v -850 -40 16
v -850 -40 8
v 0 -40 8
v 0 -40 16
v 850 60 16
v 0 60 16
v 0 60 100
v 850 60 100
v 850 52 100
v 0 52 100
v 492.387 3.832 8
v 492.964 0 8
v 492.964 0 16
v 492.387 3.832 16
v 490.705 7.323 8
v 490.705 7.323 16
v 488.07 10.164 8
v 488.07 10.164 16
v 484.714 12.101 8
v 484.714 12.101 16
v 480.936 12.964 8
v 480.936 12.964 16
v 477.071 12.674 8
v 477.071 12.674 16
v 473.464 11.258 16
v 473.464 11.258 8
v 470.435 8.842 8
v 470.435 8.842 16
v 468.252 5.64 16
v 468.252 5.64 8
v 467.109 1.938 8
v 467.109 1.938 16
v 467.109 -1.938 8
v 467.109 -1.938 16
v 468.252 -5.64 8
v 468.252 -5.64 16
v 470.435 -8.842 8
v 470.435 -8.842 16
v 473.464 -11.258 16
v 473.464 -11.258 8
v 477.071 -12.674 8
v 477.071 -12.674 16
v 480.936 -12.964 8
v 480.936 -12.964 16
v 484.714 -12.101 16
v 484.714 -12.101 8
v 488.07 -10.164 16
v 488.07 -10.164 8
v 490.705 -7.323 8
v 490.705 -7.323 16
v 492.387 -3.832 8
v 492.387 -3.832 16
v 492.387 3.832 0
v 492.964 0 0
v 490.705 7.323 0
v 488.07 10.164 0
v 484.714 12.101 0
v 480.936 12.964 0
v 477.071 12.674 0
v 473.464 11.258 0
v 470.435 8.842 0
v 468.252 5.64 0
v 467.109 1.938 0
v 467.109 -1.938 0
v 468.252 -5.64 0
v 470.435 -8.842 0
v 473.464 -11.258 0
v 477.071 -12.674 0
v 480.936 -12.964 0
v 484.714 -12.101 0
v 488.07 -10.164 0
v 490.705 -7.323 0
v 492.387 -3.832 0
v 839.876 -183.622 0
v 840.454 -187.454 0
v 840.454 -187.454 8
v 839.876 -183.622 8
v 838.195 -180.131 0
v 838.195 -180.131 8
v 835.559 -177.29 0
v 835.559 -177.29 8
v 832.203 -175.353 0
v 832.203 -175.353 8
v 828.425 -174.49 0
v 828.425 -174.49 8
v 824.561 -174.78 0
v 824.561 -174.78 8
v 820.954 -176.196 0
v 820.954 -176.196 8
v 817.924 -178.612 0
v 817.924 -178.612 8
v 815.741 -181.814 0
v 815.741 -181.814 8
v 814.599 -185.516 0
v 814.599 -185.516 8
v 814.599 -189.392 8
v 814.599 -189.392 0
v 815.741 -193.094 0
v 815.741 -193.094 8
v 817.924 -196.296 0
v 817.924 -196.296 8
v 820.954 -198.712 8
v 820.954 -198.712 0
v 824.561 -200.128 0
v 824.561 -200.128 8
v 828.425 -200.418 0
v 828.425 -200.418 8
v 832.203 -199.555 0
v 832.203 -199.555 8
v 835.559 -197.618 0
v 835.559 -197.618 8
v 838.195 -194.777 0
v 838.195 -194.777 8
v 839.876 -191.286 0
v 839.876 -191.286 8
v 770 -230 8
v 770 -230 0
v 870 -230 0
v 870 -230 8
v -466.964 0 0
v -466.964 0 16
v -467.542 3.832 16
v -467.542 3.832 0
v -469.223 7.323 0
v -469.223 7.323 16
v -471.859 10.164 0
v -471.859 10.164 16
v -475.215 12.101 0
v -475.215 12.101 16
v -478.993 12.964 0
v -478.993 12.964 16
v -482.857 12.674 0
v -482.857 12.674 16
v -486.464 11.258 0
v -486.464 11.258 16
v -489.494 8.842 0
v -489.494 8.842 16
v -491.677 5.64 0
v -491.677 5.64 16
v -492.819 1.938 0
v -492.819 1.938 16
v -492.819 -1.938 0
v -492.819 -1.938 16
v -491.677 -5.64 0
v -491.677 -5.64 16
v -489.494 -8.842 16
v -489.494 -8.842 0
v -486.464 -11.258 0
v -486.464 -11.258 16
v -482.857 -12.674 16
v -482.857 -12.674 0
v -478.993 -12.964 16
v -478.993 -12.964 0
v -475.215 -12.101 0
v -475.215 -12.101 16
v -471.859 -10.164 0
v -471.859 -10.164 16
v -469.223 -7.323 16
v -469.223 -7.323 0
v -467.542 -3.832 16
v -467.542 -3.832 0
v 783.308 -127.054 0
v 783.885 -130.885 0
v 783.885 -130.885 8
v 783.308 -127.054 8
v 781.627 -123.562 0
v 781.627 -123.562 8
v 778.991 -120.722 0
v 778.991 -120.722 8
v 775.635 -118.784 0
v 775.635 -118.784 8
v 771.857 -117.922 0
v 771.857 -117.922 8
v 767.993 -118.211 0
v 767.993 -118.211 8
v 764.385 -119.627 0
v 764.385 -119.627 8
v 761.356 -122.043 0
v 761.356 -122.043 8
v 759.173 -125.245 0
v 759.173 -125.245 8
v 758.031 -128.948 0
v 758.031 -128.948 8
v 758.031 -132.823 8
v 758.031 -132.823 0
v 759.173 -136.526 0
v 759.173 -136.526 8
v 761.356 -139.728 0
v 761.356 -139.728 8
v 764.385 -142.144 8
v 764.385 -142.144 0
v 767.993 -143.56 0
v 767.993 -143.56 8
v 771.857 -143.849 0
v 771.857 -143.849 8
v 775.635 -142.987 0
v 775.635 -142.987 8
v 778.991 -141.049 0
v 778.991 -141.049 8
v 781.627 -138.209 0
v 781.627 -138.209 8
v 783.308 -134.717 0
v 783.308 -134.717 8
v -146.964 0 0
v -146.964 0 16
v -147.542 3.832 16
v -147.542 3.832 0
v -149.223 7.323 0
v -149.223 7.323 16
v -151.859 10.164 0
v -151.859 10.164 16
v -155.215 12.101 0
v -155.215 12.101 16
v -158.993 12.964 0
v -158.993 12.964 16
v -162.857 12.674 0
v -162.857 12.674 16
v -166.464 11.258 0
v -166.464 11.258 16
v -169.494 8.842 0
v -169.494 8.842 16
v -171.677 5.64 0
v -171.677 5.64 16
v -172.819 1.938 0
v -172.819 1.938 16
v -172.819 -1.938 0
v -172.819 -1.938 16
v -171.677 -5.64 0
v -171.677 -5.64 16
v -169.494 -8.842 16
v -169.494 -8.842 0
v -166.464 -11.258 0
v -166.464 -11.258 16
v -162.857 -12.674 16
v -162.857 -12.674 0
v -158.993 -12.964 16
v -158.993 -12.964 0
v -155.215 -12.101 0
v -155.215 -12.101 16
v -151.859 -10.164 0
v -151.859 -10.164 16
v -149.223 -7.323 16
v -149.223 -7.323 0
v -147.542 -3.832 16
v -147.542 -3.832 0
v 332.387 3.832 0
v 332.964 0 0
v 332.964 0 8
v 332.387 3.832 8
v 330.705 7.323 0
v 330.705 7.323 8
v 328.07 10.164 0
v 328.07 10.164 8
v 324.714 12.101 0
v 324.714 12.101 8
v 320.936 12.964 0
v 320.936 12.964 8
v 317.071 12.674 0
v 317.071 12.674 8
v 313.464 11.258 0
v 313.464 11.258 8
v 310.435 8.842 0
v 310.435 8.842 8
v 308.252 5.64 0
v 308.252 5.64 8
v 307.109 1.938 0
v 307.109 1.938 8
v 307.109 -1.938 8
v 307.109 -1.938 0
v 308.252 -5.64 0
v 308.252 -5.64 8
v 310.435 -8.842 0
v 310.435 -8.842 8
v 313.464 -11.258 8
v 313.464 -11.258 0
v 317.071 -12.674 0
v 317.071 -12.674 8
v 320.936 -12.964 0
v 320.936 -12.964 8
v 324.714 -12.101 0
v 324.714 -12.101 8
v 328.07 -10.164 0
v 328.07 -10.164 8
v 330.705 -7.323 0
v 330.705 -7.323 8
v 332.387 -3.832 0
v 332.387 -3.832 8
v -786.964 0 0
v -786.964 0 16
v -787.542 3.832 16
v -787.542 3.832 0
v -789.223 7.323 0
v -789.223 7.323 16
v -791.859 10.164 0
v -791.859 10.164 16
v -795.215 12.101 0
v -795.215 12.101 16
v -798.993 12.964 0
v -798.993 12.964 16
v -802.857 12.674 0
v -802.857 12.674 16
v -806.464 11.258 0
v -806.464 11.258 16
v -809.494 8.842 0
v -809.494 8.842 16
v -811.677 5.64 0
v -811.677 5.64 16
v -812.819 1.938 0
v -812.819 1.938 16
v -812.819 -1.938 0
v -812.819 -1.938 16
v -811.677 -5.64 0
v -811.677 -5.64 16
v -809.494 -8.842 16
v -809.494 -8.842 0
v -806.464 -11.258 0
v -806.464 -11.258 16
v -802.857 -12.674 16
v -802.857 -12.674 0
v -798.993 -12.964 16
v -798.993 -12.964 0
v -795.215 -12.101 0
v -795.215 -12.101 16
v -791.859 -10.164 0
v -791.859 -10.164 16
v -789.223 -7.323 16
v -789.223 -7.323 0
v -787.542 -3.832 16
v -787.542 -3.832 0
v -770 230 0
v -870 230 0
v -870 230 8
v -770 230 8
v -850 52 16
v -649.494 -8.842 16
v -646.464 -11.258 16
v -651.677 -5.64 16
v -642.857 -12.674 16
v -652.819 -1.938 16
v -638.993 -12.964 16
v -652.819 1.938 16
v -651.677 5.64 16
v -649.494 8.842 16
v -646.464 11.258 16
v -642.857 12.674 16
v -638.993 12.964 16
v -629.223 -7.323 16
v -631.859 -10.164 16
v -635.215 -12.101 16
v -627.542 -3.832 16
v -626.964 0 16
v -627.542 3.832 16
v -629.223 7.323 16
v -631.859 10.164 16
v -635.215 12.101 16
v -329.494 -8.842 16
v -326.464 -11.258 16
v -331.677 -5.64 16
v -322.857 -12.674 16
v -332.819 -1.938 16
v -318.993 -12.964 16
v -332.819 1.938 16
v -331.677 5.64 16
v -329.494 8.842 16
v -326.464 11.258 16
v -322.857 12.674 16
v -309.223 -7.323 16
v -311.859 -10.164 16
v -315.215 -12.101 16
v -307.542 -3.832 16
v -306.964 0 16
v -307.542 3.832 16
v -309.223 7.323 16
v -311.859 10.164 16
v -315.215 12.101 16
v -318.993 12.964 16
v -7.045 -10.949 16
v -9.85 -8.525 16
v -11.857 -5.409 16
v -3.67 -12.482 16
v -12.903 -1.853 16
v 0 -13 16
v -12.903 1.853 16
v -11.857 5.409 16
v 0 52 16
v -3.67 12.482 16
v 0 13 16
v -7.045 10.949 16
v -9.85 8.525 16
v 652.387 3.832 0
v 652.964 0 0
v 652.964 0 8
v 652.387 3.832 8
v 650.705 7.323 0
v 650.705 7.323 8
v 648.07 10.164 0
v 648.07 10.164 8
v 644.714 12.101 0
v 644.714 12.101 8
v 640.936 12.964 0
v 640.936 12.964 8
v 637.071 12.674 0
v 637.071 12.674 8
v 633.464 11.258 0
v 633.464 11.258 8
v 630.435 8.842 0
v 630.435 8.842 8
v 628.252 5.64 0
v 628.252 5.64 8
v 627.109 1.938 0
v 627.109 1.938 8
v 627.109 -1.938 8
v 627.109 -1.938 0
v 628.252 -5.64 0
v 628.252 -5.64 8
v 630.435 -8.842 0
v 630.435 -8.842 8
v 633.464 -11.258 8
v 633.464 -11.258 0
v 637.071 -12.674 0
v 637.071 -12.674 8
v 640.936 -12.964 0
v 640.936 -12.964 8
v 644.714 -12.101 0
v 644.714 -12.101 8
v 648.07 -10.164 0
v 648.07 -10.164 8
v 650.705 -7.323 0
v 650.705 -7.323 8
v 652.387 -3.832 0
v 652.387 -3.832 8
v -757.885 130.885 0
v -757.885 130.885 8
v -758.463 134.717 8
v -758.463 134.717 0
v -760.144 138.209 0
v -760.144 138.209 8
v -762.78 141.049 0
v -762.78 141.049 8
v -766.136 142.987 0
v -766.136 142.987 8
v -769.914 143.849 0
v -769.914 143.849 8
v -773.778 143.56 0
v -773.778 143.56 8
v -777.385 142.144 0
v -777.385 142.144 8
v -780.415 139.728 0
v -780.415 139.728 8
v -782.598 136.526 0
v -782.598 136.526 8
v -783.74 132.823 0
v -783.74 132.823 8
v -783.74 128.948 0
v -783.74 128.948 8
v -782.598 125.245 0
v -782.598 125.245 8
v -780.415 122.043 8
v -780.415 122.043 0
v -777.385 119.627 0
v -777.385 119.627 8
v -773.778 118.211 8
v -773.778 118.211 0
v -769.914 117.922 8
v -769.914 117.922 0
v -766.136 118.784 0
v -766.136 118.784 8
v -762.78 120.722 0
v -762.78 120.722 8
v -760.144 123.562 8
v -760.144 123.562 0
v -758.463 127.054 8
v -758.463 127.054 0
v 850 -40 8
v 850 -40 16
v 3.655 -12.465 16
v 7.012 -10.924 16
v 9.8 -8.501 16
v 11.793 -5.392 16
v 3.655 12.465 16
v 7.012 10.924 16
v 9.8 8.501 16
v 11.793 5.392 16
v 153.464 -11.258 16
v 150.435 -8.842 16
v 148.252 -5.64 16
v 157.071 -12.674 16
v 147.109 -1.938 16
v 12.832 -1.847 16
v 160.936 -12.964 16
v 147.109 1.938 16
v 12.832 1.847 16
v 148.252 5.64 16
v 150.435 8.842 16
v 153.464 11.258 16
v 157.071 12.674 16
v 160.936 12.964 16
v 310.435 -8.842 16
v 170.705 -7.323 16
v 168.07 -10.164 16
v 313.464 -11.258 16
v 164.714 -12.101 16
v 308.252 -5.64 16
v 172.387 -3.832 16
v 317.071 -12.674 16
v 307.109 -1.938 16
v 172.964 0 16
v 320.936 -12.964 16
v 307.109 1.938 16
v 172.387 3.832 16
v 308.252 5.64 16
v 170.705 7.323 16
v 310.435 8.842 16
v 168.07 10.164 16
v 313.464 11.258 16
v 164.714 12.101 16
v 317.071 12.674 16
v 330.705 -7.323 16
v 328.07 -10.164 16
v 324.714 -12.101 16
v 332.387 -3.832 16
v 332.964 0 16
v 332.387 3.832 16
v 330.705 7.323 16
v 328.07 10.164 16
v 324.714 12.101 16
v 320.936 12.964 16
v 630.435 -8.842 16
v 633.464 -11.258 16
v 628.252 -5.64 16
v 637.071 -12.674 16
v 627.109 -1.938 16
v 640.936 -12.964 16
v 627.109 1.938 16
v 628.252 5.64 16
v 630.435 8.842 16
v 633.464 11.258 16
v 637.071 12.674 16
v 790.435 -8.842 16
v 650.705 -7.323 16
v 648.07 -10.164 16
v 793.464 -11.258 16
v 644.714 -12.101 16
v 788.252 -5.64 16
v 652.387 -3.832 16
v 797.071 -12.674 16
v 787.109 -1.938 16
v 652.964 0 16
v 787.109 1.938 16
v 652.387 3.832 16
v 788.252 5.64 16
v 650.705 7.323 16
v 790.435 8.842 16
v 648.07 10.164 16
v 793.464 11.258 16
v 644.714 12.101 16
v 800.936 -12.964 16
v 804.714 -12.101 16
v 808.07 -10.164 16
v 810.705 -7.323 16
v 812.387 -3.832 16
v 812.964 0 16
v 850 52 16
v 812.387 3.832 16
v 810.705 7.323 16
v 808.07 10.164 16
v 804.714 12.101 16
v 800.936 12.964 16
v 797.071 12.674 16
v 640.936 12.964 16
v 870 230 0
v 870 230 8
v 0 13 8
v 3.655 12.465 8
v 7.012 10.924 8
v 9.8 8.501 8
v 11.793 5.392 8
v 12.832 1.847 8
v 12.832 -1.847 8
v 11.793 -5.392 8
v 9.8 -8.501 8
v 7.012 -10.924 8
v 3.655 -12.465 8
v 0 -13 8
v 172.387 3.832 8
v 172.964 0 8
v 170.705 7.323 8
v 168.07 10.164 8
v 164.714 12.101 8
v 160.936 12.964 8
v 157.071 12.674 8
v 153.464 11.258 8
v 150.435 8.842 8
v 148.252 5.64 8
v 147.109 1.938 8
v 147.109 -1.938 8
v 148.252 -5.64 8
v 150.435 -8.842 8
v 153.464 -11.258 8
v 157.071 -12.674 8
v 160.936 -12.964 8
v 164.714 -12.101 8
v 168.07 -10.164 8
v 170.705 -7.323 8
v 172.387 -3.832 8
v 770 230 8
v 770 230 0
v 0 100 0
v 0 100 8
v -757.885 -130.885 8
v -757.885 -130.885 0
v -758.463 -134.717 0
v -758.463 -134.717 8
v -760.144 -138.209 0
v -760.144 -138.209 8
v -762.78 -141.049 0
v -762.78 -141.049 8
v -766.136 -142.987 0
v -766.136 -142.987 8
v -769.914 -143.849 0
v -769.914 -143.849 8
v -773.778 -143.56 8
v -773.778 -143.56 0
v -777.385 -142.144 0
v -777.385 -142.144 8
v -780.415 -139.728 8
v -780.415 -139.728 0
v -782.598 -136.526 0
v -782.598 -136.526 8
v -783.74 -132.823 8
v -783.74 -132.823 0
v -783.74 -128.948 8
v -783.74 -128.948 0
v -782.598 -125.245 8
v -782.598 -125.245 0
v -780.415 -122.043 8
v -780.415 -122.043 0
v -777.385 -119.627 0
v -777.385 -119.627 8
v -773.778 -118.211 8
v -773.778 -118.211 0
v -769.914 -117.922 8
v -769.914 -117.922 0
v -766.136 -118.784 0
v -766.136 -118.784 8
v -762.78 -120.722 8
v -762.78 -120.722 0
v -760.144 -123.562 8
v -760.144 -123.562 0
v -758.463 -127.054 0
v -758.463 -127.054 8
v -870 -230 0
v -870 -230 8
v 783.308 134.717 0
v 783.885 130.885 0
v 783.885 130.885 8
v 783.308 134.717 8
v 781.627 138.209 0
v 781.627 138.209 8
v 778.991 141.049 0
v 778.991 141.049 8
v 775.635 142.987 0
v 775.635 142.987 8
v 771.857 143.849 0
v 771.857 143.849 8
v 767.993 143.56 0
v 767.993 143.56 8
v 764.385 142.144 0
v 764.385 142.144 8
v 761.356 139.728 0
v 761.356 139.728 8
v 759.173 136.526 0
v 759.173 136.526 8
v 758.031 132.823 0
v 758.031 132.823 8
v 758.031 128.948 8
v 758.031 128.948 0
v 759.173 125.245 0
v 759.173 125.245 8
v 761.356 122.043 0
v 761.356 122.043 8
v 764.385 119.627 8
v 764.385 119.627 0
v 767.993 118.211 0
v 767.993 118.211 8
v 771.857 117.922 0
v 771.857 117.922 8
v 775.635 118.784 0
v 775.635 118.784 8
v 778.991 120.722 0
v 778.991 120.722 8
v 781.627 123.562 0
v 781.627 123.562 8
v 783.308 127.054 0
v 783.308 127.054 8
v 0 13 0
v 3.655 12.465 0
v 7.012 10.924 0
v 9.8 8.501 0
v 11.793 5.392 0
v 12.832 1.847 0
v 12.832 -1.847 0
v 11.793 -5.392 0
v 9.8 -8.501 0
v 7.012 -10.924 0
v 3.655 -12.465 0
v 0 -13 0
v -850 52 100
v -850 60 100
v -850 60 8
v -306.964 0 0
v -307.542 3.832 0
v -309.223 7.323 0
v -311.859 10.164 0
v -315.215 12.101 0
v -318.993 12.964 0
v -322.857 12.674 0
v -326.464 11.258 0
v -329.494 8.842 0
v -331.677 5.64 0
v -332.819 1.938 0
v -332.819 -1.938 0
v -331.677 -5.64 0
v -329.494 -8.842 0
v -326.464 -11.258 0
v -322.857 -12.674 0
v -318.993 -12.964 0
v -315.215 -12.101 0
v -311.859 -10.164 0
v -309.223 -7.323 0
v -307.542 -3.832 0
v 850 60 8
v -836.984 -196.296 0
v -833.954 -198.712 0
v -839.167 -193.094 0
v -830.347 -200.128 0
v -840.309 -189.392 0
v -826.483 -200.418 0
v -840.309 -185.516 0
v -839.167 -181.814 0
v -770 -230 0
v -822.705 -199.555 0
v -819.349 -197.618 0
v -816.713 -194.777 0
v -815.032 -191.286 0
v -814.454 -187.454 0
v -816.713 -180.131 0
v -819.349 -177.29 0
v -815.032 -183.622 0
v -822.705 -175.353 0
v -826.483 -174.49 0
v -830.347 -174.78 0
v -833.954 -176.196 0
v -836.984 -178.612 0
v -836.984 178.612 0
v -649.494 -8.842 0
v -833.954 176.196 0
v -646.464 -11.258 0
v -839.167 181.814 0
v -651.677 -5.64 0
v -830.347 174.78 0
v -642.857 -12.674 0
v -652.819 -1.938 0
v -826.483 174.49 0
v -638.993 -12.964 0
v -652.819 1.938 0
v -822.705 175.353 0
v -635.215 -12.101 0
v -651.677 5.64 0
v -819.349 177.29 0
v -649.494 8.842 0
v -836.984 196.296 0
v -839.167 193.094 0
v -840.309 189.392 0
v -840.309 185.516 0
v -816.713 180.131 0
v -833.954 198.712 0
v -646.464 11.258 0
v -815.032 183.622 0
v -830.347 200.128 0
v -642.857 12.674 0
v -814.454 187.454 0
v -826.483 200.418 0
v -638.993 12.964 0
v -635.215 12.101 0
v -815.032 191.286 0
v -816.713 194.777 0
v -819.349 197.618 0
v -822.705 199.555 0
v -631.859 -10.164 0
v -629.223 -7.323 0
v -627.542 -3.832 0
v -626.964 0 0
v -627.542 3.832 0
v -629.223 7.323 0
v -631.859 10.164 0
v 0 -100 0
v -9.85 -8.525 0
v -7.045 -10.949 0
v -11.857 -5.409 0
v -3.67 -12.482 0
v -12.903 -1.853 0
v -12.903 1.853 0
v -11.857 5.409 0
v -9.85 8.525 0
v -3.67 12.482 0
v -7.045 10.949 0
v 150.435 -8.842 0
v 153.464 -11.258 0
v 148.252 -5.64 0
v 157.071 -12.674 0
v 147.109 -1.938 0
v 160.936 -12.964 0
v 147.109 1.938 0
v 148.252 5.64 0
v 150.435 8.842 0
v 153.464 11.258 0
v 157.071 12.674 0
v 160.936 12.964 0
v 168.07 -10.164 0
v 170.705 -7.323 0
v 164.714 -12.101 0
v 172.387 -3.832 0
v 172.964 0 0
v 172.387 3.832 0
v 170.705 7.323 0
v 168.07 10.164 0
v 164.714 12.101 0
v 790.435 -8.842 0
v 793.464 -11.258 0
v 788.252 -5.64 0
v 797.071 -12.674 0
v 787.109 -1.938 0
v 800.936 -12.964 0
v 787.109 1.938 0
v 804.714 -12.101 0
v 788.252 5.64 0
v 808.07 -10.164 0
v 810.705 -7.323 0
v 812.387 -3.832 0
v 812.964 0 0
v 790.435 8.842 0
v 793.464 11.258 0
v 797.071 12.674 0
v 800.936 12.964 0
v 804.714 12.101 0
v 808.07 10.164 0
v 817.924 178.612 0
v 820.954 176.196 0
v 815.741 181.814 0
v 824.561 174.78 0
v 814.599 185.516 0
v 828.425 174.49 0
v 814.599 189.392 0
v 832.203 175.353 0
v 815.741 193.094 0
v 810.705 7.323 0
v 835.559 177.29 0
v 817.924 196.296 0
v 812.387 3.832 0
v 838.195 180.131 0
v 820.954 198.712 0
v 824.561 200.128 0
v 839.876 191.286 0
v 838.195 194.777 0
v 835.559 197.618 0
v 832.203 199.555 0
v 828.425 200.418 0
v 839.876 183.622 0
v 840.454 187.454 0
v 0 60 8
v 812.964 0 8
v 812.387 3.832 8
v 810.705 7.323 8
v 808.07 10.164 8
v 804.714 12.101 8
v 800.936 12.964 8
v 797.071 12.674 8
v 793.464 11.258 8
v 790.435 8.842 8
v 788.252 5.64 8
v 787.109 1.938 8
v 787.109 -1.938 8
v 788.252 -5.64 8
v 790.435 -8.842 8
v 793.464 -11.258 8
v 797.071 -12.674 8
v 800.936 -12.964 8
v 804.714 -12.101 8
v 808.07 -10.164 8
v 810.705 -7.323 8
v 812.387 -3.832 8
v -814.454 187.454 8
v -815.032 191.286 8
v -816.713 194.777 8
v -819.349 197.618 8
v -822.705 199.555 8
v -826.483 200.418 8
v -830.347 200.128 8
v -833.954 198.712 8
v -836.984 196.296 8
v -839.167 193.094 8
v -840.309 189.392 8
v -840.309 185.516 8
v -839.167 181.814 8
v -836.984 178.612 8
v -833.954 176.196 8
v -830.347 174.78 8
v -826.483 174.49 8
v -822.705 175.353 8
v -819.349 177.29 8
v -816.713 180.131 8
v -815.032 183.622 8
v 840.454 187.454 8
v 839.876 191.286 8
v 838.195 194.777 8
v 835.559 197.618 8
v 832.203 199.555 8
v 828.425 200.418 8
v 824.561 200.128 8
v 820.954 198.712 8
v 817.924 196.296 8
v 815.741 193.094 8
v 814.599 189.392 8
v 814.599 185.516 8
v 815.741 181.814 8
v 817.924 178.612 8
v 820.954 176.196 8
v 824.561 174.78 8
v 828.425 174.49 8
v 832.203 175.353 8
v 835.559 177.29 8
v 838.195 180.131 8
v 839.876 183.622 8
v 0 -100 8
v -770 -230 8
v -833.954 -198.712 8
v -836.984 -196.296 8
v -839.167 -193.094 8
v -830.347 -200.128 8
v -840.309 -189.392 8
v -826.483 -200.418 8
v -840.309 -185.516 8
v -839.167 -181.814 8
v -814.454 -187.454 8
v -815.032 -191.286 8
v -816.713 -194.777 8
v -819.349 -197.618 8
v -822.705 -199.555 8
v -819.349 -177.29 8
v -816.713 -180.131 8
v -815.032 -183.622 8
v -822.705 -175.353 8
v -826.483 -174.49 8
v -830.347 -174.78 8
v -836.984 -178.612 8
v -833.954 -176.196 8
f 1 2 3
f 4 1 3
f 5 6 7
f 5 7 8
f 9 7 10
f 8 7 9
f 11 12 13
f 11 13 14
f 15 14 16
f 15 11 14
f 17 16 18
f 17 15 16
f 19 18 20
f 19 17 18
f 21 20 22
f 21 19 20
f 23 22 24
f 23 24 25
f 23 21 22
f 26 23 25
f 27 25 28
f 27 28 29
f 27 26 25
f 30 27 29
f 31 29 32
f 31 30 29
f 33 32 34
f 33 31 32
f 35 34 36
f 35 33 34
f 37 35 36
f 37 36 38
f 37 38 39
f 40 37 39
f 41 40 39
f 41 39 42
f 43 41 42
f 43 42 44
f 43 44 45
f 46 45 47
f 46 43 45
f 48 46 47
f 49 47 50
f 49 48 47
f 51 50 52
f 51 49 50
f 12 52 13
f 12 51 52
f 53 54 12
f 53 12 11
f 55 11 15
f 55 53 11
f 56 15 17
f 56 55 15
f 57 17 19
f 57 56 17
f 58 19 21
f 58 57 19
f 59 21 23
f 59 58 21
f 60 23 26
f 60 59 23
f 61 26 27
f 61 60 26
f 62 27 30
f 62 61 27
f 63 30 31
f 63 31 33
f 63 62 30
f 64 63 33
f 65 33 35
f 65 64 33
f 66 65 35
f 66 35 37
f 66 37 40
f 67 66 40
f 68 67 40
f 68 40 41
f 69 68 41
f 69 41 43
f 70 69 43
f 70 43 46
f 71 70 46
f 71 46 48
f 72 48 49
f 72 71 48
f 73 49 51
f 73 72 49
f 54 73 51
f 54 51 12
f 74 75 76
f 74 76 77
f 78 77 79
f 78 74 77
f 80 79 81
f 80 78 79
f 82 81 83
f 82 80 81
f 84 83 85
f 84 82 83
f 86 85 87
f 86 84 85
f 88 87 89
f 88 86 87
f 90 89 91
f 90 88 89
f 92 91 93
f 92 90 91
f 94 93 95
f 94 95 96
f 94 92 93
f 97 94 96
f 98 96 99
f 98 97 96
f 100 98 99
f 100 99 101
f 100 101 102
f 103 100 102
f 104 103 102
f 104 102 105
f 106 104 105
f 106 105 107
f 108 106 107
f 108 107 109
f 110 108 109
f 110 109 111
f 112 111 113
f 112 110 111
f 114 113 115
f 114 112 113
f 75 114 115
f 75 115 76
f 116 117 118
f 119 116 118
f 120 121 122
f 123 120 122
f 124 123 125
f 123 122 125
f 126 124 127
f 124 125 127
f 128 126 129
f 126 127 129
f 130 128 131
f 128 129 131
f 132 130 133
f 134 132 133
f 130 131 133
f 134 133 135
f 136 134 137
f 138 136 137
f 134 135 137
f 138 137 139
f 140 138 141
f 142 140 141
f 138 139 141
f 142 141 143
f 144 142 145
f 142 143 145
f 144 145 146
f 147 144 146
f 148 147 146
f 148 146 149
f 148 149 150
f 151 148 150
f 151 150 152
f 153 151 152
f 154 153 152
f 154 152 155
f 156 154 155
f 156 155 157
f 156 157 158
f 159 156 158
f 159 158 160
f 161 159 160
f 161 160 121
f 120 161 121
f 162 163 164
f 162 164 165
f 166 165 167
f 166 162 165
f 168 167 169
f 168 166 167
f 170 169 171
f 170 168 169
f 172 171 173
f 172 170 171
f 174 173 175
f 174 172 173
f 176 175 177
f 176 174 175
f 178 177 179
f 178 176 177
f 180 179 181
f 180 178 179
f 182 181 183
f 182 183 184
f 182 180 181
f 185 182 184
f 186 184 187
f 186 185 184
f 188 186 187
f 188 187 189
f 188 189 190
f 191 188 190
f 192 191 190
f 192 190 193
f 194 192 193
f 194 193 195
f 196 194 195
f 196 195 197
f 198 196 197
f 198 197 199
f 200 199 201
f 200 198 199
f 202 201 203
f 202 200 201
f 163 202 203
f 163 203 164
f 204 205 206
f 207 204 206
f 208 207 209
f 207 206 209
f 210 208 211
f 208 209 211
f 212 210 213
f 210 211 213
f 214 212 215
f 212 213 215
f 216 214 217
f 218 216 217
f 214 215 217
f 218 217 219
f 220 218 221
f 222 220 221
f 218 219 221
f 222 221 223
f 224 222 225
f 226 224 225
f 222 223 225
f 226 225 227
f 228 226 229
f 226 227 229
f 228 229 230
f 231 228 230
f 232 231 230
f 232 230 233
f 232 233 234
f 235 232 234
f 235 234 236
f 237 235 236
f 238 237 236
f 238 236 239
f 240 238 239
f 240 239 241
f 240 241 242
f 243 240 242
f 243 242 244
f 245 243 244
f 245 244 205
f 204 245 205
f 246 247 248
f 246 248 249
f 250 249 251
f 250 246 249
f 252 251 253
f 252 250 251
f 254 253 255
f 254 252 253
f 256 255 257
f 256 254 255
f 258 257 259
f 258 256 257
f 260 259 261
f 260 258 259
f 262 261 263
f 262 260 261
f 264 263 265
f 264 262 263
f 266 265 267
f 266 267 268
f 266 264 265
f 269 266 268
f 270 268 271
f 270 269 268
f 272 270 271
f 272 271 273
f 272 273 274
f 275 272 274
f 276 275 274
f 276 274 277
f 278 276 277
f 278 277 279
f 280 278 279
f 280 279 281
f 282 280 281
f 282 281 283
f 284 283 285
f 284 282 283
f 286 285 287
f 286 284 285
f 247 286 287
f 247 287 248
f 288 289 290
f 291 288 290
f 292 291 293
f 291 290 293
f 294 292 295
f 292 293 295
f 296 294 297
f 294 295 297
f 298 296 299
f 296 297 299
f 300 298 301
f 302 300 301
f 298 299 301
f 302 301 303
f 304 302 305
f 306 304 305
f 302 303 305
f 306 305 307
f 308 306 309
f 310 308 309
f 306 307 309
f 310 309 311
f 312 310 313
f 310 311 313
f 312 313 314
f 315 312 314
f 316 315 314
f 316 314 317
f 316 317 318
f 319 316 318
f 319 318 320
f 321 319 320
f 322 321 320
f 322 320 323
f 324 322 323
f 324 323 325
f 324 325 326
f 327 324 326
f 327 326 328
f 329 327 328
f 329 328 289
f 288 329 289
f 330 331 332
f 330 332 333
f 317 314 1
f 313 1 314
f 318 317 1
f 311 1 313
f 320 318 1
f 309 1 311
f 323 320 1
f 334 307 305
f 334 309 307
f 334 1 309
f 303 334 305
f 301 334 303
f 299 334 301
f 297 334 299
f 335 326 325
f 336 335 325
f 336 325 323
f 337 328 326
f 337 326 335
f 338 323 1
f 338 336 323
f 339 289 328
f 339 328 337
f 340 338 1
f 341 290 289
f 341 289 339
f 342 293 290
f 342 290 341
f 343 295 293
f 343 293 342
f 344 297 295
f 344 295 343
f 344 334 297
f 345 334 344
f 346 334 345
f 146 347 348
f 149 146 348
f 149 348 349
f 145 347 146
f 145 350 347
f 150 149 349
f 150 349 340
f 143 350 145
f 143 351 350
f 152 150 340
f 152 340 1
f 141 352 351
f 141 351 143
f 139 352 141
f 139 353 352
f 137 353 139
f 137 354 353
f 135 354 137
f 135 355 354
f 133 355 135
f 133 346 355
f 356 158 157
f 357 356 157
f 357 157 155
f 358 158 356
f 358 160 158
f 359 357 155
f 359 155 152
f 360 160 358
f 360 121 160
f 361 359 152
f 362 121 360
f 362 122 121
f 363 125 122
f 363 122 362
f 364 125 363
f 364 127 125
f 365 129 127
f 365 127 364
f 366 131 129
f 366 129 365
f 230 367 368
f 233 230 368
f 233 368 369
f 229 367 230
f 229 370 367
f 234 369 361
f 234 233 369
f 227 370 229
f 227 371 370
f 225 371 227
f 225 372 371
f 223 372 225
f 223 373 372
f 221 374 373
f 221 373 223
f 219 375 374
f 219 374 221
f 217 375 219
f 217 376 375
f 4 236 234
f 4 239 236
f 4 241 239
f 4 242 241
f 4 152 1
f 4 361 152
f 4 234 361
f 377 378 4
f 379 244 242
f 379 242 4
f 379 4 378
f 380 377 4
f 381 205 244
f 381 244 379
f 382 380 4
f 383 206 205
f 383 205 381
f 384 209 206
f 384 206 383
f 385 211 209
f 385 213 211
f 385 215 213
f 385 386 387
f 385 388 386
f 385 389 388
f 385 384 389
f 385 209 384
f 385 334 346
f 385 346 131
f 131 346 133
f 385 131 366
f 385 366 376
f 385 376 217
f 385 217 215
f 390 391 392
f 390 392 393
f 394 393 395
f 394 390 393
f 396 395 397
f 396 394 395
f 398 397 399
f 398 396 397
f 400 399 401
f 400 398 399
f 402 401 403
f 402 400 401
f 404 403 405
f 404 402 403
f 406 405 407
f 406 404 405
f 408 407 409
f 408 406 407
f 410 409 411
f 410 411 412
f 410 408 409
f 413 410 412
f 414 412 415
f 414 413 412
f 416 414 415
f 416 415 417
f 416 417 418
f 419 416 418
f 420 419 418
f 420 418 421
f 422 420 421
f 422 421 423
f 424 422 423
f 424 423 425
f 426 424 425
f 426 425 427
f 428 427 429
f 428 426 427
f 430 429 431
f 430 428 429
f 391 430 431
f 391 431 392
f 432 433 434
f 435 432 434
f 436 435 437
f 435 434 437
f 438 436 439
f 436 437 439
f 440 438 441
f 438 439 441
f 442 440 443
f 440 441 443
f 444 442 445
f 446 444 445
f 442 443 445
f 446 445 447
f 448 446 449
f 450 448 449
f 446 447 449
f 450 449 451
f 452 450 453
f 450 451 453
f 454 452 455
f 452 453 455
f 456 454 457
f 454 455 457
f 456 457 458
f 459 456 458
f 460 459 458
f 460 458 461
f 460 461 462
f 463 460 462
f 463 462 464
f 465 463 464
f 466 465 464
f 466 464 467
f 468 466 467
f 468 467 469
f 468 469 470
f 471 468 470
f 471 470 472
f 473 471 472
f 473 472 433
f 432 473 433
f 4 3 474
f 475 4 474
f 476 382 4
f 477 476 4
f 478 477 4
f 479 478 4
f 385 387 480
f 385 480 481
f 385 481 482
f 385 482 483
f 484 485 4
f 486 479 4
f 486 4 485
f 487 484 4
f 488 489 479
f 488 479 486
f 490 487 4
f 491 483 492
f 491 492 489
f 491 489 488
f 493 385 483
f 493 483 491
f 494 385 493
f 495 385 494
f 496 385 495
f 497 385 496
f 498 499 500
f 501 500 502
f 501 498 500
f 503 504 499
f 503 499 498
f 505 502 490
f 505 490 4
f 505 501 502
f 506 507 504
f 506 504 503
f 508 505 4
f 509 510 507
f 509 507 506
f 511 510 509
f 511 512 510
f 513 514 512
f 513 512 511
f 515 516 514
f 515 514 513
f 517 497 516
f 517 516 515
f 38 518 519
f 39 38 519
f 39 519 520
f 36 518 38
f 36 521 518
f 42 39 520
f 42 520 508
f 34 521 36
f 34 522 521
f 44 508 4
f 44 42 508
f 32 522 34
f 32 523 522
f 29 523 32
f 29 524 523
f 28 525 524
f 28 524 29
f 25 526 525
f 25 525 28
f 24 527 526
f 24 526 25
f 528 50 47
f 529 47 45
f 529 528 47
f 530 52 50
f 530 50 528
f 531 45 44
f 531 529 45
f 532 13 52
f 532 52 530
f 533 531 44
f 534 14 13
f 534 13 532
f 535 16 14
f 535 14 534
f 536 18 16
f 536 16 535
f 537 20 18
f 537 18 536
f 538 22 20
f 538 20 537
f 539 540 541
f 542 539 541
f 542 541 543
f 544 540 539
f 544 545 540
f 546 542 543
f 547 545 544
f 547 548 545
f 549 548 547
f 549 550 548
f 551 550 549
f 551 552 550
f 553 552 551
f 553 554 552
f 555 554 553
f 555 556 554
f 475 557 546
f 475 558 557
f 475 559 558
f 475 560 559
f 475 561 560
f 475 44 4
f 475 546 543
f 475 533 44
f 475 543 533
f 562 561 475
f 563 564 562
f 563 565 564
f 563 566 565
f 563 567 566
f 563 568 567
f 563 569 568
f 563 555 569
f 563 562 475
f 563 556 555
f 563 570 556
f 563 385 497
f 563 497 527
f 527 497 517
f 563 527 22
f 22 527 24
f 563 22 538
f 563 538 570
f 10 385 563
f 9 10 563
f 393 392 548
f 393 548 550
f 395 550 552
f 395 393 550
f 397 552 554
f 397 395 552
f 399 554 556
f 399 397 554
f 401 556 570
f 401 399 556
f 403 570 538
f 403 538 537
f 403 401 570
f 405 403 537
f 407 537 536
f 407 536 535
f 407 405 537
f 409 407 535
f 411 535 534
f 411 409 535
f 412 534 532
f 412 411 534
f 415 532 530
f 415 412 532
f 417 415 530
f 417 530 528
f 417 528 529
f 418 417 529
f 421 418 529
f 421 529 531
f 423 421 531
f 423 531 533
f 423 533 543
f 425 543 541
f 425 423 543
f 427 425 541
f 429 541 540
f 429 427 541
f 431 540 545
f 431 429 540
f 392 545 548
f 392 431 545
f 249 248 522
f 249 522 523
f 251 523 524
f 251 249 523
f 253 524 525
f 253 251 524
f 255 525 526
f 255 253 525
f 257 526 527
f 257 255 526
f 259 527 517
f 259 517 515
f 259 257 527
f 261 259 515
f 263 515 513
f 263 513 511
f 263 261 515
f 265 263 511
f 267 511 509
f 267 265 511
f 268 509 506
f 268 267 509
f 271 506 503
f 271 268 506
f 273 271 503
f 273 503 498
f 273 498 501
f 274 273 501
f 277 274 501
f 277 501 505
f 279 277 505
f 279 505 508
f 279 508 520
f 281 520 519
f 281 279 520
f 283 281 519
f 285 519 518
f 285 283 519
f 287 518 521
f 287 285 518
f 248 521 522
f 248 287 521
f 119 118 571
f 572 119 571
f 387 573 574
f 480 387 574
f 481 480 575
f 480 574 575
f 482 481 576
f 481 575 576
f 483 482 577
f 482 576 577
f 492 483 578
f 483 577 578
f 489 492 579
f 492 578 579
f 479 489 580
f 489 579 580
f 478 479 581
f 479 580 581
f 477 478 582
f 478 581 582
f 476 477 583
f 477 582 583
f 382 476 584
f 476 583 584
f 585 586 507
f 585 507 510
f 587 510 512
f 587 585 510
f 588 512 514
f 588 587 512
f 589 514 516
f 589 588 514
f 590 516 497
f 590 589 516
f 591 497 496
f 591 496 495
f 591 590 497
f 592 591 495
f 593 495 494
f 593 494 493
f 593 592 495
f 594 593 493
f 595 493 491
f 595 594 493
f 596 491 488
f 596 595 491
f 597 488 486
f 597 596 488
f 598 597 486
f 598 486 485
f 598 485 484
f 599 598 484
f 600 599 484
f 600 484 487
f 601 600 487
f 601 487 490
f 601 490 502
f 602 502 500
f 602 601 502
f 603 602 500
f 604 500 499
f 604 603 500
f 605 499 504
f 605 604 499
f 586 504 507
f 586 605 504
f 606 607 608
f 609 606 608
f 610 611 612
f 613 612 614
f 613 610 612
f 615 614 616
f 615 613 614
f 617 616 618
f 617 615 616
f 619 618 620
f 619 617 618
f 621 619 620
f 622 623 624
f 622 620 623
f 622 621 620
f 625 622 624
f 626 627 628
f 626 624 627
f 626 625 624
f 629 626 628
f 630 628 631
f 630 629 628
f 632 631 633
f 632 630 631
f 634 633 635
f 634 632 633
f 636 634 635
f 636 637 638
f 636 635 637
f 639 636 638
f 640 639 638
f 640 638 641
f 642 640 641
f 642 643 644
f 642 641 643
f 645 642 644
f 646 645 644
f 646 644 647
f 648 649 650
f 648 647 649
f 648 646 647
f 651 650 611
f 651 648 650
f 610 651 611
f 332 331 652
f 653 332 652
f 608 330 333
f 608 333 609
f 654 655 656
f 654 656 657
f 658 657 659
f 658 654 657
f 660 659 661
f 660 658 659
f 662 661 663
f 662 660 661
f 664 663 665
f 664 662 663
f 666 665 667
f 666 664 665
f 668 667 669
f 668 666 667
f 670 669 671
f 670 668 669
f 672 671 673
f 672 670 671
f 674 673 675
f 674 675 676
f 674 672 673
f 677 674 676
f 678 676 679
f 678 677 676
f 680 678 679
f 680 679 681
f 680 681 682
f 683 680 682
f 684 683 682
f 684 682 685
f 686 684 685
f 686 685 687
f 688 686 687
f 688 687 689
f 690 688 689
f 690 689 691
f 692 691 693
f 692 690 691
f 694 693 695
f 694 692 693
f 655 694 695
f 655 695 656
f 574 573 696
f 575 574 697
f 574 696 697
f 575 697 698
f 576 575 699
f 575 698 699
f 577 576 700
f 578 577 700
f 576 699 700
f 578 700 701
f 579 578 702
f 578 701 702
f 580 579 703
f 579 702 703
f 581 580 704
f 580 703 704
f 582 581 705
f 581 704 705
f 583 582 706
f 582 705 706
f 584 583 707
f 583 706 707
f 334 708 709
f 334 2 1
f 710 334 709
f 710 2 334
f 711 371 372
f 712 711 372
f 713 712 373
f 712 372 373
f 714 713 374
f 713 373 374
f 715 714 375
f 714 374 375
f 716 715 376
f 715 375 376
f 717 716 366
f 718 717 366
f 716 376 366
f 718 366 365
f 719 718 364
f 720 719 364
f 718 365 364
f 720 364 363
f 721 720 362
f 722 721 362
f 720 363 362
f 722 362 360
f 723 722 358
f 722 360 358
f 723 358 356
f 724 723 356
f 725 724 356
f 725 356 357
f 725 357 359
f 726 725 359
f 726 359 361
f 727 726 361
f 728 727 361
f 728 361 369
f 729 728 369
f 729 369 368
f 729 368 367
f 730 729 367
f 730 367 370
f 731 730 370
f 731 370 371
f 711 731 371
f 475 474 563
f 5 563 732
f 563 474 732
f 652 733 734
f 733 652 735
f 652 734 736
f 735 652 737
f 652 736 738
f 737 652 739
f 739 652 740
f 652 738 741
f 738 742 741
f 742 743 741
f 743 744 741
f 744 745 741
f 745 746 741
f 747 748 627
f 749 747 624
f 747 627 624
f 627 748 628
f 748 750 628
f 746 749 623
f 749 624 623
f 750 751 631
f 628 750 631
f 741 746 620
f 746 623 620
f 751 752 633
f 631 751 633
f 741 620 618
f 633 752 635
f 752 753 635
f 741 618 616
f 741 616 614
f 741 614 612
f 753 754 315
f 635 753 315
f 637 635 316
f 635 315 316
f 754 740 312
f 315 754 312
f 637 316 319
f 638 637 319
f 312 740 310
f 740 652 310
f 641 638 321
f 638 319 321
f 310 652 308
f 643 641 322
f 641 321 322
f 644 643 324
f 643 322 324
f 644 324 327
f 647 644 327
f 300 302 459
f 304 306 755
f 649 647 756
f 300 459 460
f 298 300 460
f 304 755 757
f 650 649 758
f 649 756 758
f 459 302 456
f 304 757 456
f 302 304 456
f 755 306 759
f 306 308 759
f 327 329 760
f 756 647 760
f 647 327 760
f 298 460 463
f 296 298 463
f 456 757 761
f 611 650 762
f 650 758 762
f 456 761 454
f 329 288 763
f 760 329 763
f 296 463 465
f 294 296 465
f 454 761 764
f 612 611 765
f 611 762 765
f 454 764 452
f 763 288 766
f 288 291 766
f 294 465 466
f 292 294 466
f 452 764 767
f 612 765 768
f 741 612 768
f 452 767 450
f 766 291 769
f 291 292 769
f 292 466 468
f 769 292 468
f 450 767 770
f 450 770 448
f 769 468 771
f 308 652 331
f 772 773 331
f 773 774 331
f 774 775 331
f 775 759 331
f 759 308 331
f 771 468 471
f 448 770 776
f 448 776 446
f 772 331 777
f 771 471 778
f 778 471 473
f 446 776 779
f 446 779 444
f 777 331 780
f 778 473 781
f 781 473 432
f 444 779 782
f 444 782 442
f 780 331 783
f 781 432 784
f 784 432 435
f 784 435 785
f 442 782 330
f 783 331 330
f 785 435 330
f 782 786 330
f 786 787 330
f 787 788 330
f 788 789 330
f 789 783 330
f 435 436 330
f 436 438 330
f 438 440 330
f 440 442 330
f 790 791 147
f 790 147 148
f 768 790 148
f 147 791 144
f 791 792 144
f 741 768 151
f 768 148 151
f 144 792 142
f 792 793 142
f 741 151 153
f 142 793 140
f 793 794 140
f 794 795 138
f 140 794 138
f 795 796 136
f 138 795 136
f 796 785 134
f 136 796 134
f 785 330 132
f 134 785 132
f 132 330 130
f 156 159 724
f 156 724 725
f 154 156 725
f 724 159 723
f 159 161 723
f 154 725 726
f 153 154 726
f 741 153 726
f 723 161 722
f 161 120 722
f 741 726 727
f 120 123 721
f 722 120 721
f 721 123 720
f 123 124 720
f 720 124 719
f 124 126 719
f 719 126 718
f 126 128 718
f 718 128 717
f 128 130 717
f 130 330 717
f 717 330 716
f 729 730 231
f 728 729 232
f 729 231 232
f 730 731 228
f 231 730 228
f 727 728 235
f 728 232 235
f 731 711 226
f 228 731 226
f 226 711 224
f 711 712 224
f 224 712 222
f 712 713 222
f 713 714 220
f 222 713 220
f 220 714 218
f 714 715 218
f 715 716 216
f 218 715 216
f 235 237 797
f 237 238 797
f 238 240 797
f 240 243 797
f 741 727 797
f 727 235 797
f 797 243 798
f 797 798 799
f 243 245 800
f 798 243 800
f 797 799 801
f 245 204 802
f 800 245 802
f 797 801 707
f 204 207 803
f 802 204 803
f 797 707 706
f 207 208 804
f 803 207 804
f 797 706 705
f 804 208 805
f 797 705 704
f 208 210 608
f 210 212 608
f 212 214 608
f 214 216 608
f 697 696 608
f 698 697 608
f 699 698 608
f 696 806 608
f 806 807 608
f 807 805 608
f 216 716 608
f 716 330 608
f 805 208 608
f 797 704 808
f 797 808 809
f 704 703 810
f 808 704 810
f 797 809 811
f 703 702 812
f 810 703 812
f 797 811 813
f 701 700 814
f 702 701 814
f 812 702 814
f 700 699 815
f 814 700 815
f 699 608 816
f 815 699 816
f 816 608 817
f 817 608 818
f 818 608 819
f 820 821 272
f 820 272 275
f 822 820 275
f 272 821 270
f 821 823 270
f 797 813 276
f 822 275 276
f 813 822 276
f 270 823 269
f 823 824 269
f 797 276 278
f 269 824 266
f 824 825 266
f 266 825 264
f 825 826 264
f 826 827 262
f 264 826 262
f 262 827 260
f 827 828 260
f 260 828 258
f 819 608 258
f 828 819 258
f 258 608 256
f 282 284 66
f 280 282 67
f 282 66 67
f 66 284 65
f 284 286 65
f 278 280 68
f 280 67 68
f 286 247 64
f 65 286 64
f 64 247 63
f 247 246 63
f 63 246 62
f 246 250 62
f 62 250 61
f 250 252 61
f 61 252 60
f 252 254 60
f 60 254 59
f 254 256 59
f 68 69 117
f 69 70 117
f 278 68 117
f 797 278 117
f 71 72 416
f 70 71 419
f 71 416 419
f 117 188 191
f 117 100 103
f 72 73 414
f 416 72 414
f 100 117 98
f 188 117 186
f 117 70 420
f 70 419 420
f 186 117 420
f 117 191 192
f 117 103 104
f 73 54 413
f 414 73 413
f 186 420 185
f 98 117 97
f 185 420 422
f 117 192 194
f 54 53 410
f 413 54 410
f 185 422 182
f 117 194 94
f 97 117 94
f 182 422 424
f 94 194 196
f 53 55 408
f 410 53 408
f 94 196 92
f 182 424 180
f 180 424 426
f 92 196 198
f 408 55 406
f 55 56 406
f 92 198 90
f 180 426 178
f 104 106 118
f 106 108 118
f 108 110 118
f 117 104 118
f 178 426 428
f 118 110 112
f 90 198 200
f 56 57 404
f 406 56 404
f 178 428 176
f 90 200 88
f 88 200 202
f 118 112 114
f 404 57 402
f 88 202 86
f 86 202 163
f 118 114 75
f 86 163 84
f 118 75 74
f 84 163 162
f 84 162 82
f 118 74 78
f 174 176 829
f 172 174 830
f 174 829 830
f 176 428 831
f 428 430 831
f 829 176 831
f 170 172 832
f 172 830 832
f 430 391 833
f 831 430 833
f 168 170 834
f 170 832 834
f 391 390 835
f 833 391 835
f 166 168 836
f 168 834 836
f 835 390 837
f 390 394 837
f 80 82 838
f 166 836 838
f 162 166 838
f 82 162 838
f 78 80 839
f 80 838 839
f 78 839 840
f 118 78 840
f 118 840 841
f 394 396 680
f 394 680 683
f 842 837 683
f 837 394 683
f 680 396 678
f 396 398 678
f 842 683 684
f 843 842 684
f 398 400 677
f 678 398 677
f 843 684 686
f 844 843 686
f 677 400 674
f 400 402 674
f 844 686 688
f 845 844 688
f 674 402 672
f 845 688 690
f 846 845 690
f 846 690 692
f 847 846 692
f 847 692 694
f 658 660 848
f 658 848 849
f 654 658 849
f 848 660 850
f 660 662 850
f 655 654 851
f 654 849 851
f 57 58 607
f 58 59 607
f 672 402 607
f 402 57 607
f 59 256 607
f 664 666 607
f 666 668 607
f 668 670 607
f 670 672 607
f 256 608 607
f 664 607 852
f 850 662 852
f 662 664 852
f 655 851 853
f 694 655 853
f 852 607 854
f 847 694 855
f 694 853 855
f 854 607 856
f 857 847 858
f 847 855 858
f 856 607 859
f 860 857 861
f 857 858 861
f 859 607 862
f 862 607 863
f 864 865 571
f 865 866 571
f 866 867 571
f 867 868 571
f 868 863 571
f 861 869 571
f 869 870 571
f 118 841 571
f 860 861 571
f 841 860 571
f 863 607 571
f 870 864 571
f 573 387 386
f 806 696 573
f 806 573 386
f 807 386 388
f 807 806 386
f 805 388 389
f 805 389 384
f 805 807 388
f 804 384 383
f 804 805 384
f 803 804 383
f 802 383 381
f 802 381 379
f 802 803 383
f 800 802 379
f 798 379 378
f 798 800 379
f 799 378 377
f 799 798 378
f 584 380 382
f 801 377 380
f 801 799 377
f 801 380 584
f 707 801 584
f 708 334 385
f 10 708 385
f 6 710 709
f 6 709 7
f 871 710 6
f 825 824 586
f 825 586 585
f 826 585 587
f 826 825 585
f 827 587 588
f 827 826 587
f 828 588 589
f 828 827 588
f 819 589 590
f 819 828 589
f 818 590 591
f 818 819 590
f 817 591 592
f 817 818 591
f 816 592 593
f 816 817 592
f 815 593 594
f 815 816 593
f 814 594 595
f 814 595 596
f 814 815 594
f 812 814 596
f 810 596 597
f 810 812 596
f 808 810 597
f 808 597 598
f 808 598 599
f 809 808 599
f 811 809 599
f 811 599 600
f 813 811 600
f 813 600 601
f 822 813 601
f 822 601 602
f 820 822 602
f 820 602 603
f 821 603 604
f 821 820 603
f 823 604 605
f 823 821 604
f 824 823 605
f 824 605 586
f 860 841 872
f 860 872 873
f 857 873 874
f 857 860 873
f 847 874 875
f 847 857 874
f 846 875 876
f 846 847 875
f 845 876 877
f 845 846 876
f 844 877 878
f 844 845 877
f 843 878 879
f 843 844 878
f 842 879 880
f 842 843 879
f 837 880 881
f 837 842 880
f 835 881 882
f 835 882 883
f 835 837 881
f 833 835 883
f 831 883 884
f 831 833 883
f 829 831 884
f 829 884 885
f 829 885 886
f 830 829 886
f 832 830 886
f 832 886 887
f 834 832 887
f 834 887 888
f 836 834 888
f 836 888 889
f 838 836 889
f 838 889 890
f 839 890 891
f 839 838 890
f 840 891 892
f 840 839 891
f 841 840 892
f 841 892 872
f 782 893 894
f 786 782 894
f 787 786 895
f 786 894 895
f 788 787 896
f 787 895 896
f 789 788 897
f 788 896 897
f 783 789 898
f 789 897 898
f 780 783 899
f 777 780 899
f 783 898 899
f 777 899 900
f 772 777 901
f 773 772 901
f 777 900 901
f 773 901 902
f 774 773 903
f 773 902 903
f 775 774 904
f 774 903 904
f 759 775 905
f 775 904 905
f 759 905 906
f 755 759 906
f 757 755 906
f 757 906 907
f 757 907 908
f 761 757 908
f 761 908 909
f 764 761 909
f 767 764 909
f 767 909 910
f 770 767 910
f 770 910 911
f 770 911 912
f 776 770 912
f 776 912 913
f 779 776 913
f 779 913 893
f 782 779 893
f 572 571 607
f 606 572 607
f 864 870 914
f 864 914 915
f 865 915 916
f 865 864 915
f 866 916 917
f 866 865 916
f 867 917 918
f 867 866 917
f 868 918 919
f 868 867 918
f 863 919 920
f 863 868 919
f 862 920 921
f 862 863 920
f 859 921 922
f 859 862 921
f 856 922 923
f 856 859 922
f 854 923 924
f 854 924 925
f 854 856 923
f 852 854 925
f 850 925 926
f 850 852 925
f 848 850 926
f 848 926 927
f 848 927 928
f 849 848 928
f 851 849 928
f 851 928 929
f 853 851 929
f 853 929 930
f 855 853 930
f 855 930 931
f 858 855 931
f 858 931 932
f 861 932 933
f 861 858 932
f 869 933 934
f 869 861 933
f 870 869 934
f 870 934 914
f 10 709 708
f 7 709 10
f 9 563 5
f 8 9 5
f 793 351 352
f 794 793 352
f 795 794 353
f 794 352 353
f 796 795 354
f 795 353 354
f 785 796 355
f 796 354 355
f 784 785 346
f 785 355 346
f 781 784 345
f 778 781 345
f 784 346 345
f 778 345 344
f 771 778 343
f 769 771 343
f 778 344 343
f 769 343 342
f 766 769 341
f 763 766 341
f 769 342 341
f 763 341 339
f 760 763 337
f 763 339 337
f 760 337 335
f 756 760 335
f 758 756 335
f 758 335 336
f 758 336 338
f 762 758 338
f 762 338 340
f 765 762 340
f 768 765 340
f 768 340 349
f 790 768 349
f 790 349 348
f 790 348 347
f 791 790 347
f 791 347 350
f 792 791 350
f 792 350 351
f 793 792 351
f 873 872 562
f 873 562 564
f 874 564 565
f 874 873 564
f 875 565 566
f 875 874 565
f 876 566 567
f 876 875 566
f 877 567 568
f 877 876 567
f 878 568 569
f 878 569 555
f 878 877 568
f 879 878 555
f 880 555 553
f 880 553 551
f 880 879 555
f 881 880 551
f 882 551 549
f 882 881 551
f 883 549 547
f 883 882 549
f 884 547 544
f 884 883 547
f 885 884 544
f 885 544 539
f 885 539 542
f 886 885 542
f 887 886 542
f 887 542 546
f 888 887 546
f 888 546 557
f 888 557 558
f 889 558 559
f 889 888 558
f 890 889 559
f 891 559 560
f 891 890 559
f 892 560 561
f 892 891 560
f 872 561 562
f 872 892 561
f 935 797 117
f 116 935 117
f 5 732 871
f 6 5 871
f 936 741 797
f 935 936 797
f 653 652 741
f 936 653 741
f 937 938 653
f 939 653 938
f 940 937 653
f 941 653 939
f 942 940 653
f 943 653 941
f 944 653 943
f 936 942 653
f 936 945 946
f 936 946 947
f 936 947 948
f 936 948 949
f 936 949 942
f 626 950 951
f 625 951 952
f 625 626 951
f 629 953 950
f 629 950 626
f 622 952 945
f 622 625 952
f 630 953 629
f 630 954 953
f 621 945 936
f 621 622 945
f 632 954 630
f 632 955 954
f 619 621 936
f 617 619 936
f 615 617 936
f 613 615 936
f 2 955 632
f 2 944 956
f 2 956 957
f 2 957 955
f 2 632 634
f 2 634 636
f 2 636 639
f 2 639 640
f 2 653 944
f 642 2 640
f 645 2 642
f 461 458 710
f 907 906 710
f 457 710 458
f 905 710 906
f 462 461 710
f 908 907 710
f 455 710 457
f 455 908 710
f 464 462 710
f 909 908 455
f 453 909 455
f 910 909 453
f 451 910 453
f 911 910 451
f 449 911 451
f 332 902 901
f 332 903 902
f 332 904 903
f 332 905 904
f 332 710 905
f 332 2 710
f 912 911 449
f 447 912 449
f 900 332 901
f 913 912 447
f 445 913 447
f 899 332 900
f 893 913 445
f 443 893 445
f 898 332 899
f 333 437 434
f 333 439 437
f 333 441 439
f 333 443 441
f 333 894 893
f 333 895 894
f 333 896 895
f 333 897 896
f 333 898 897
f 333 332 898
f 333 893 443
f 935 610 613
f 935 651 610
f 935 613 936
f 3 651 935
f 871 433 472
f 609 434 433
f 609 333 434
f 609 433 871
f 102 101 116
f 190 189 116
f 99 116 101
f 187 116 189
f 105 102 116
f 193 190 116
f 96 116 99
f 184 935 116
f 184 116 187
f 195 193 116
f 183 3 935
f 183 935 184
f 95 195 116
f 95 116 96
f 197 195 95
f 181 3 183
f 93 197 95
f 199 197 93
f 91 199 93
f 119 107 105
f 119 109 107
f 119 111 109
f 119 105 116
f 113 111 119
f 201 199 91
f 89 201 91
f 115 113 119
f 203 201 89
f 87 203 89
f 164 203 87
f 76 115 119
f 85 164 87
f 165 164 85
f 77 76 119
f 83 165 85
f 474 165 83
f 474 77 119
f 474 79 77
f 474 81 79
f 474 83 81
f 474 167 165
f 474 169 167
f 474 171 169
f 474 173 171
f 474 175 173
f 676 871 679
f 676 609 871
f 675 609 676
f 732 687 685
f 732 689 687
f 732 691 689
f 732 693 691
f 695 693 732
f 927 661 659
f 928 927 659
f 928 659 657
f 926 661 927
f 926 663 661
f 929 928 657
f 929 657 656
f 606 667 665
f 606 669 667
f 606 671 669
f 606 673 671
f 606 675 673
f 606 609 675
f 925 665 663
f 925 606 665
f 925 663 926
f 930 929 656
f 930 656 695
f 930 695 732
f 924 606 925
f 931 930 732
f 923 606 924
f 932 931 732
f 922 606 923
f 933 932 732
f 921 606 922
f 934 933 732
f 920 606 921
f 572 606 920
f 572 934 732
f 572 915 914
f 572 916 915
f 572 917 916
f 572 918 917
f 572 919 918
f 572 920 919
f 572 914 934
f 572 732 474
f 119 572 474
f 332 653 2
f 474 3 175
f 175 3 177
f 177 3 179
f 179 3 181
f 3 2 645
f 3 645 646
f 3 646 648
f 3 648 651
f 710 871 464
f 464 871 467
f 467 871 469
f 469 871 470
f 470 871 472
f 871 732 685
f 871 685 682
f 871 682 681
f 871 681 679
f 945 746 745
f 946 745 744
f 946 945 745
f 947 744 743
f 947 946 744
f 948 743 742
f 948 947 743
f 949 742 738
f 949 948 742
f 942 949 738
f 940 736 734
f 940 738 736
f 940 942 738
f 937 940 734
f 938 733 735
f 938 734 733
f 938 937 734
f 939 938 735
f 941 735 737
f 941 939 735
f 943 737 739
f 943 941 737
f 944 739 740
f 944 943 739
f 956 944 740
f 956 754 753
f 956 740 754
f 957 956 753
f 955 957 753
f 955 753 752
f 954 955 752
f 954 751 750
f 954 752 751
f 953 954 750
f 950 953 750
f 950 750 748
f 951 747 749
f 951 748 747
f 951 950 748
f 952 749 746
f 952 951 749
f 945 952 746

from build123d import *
from build123d.topology import SkipClean

# Parameters (mm, degrees)
EXTRUDE_2_DEPTH        = 8
SKETCH_5_W             = 850
SKETCH_5_H             = 100
EXTRUDE_3_DEPTH        = 8
SKETCH_6_W             = 850
SKETCH_6_H             = 8
EXTRUDE_4_DEPTH        = 84
SKETCH_7_R             = 13
CUT_EXTRUDE_1_DEPTH    = 905.579460302
SKETCH_9_R             = 13
CUT_EXTRUDE_3_DEPTH    = 904.800863022
PATTERN_LINEAR_2_COUNT = 6
PATTERN_LINEAR_2_PITCH = 160
MIRROR_7_DEPTH         = 16
MIRROR_7_2_OUTLINE_R   = 13
MIRROR_7_2_DEPTH       = 8
MIRROR_START           = 8
MIRROR_7_3_OUTLINE_R   = 13
MIRROR_7_3_DEPTH       = 8
MIRROR_START_2         = 16
MIRROR_7_4_OUTLINE_W   = 850
MIRROR_7_4_OUTLINE_H   = 8
MIRROR_7_4_DEPTH       = 84


# Read off the part's stored shape, not the designer's step: 镜向7
with BuildPart() as part:
    # 草图1 → 凸台-拉伸2 (new body)
    with BuildSketch(Plane.XY):
        Polygon((-870, 0), (-870, 230), (-770, 230), (0, 100), (0, 0), align=None)
    extrude_2 = extrude(amount=EXTRUDE_2_DEPTH)

    # 镜向2: 凸台-拉伸2 across plane
    add(extrude_2.mirror(Plane.ZX))

    # 草图5 → 凸台-拉伸3 (add)
    with BuildSketch(Plane.XY.offset(8)):
        with Locations((-425, 10)):
            Rectangle(SKETCH_5_W, SKETCH_5_H)
    extrude(amount=EXTRUDE_3_DEPTH)

    # 草图6 → 凸台-拉伸4 (add)
    with BuildSketch(Plane.XY.offset(16)):
        with Locations((-425, 56)):
            Rectangle(SKETCH_6_W, SKETCH_6_H)
    extrude(amount=EXTRUDE_4_DEPTH)

    # 草图7 → 切除-拉伸1 (cut, through all)
    with BuildSketch(Plane.XY.offset(8)):
        with Locations((-770.885465198, 130.885465198)):
            Circle(SKETCH_7_R)
        with Locations((-827.454007693, 187.454007693)):
            Circle(SKETCH_7_R)
    cut_extrude_1 = extrude(amount=-CUT_EXTRUDE_1_DEPTH, mode=Mode.SUBTRACT)

    # 镜向5: 切除-拉伸1 across plane
    add(cut_extrude_1.mirror(Plane.ZX), mode=Mode.SUBTRACT)

    # 草图9 → 切除-拉伸3 (cut, through all)
    with BuildSketch(Plane.XY.offset(16)):
        with Locations((-799.964208957, 0)):
            Circle(SKETCH_9_R)
    cut_extrude_3 = extrude(amount=-CUT_EXTRUDE_3_DEPTH, mode=Mode.SUBTRACT)

    # 阵列(线性)2: 切除-拉伸3 ×6
    with Locations(*[(i * PATTERN_LINEAR_2_PITCH, 0, 0) for i in range(1, PATTERN_LINEAR_2_COUNT)]):
        add(cut_extrude_3, mode=Mode.SUBTRACT)

    # 镜向7 outline → 镜向7 (cut)
    with BuildSketch(Plane.XY):
        with BuildLine():
            ThreePointArc((0, -12.999950731), (-12.964208957, 0), (0, 12.999950731))
            ThreePointArc((0, 12.999950731), (-13.035791043, 0), (0, -12.999950731))
        make_face()
    extrude(amount=MIRROR_7_DEPTH, mode=Mode.SUBTRACT)

    # Mirror 7 2 outline → Mirror 7 2 (add)
    with BuildSketch(Plane.XY):
        with BuildLine():
            Line((870, -230), (870, 230))
            Line((870, 230), (770, 230))
            Line((770, 230), (0, 100))
            Line((0, 100), (0, 12.999950731))
            ThreePointArc((0, 12.999950731), (12.964208957, 0), (0, -12.999950731))
            Line((0, -12.999950731), (0, -100))
            Line((0, -100), (770, -230))
            Line((770, -230), (870, -230))
        make_face()
        with Locations((827.454007693, -187.454007693)):
            Circle(MIRROR_7_2_OUTLINE_R, mode=Mode.SUBTRACT)
        with Locations((770.885465198, -130.885465198)):
            Circle(MIRROR_7_2_OUTLINE_R, mode=Mode.SUBTRACT)
        with Locations((770.885465198, 130.885465198)):
            Circle(MIRROR_7_2_OUTLINE_R, mode=Mode.SUBTRACT)
        with Locations((827.454007693, 187.454007693)):
            Circle(MIRROR_7_2_OUTLINE_R, mode=Mode.SUBTRACT)
        with Locations((639.964208957, 0)):
            Circle(MIRROR_7_2_OUTLINE_R, mode=Mode.SUBTRACT)
        with Locations((799.964208957, 0)):
            Circle(MIRROR_7_2_OUTLINE_R, mode=Mode.SUBTRACT)
        with Locations((159.964208957, 0)):
            Circle(MIRROR_7_2_OUTLINE_R, mode=Mode.SUBTRACT)
        with Locations((319.964208957, 0)):
            Circle(MIRROR_7_2_OUTLINE_R, mode=Mode.SUBTRACT)
        with Locations((479.964208957, 0)):
            Circle(MIRROR_7_2_OUTLINE_R, mode=Mode.SUBTRACT)
    extrude(amount=MIRROR_7_2_DEPTH)

    # Mirror 7 3 outline → Mirror 7 3 (add)
    with SkipClean():  # the faces are left unmerged after this step: merging them gives an invalid solid
        with BuildSketch(Plane.XY.offset(MIRROR_START)):
            with BuildLine():
                Line((850, 60), (0, 60))
                Line((0, 60), (0, 12.999950731))
                ThreePointArc((0, 12.999950731), (12.964208957, 0), (0, -12.999950731))
                Line((0, -12.999950731), (0, -40))
                Line((0, -40), (850, -40))
                Line((850, -40), (850, 60))
            make_face()
            with Locations((799.964208957, 0)):
                Circle(MIRROR_7_3_OUTLINE_R, mode=Mode.SUBTRACT)
            with Locations((159.964208957, 0)):
                Circle(MIRROR_7_3_OUTLINE_R, mode=Mode.SUBTRACT)
            with Locations((319.964208957, 0)):
                Circle(MIRROR_7_3_OUTLINE_R, mode=Mode.SUBTRACT)
            with Locations((479.964208957, 0)):
                Circle(MIRROR_7_3_OUTLINE_R, mode=Mode.SUBTRACT)
            with Locations((639.964208957, 0)):
                Circle(MIRROR_7_3_OUTLINE_R, mode=Mode.SUBTRACT)
        extrude(amount=MIRROR_7_3_DEPTH)

    # Mirror 7 4 outline → Mirror 7 4 (add)
    with SkipClean():  # the faces are left unmerged after this step: merging them gives an invalid solid
        with BuildSketch(Plane.XY.offset(MIRROR_START_2)):
            with Locations((425, 56)):
                Rectangle(MIRROR_7_4_OUTLINE_W, MIRROR_7_4_OUTLINE_H)
        extrude(amount=MIRROR_7_4_DEPTH)


solid = part.part
